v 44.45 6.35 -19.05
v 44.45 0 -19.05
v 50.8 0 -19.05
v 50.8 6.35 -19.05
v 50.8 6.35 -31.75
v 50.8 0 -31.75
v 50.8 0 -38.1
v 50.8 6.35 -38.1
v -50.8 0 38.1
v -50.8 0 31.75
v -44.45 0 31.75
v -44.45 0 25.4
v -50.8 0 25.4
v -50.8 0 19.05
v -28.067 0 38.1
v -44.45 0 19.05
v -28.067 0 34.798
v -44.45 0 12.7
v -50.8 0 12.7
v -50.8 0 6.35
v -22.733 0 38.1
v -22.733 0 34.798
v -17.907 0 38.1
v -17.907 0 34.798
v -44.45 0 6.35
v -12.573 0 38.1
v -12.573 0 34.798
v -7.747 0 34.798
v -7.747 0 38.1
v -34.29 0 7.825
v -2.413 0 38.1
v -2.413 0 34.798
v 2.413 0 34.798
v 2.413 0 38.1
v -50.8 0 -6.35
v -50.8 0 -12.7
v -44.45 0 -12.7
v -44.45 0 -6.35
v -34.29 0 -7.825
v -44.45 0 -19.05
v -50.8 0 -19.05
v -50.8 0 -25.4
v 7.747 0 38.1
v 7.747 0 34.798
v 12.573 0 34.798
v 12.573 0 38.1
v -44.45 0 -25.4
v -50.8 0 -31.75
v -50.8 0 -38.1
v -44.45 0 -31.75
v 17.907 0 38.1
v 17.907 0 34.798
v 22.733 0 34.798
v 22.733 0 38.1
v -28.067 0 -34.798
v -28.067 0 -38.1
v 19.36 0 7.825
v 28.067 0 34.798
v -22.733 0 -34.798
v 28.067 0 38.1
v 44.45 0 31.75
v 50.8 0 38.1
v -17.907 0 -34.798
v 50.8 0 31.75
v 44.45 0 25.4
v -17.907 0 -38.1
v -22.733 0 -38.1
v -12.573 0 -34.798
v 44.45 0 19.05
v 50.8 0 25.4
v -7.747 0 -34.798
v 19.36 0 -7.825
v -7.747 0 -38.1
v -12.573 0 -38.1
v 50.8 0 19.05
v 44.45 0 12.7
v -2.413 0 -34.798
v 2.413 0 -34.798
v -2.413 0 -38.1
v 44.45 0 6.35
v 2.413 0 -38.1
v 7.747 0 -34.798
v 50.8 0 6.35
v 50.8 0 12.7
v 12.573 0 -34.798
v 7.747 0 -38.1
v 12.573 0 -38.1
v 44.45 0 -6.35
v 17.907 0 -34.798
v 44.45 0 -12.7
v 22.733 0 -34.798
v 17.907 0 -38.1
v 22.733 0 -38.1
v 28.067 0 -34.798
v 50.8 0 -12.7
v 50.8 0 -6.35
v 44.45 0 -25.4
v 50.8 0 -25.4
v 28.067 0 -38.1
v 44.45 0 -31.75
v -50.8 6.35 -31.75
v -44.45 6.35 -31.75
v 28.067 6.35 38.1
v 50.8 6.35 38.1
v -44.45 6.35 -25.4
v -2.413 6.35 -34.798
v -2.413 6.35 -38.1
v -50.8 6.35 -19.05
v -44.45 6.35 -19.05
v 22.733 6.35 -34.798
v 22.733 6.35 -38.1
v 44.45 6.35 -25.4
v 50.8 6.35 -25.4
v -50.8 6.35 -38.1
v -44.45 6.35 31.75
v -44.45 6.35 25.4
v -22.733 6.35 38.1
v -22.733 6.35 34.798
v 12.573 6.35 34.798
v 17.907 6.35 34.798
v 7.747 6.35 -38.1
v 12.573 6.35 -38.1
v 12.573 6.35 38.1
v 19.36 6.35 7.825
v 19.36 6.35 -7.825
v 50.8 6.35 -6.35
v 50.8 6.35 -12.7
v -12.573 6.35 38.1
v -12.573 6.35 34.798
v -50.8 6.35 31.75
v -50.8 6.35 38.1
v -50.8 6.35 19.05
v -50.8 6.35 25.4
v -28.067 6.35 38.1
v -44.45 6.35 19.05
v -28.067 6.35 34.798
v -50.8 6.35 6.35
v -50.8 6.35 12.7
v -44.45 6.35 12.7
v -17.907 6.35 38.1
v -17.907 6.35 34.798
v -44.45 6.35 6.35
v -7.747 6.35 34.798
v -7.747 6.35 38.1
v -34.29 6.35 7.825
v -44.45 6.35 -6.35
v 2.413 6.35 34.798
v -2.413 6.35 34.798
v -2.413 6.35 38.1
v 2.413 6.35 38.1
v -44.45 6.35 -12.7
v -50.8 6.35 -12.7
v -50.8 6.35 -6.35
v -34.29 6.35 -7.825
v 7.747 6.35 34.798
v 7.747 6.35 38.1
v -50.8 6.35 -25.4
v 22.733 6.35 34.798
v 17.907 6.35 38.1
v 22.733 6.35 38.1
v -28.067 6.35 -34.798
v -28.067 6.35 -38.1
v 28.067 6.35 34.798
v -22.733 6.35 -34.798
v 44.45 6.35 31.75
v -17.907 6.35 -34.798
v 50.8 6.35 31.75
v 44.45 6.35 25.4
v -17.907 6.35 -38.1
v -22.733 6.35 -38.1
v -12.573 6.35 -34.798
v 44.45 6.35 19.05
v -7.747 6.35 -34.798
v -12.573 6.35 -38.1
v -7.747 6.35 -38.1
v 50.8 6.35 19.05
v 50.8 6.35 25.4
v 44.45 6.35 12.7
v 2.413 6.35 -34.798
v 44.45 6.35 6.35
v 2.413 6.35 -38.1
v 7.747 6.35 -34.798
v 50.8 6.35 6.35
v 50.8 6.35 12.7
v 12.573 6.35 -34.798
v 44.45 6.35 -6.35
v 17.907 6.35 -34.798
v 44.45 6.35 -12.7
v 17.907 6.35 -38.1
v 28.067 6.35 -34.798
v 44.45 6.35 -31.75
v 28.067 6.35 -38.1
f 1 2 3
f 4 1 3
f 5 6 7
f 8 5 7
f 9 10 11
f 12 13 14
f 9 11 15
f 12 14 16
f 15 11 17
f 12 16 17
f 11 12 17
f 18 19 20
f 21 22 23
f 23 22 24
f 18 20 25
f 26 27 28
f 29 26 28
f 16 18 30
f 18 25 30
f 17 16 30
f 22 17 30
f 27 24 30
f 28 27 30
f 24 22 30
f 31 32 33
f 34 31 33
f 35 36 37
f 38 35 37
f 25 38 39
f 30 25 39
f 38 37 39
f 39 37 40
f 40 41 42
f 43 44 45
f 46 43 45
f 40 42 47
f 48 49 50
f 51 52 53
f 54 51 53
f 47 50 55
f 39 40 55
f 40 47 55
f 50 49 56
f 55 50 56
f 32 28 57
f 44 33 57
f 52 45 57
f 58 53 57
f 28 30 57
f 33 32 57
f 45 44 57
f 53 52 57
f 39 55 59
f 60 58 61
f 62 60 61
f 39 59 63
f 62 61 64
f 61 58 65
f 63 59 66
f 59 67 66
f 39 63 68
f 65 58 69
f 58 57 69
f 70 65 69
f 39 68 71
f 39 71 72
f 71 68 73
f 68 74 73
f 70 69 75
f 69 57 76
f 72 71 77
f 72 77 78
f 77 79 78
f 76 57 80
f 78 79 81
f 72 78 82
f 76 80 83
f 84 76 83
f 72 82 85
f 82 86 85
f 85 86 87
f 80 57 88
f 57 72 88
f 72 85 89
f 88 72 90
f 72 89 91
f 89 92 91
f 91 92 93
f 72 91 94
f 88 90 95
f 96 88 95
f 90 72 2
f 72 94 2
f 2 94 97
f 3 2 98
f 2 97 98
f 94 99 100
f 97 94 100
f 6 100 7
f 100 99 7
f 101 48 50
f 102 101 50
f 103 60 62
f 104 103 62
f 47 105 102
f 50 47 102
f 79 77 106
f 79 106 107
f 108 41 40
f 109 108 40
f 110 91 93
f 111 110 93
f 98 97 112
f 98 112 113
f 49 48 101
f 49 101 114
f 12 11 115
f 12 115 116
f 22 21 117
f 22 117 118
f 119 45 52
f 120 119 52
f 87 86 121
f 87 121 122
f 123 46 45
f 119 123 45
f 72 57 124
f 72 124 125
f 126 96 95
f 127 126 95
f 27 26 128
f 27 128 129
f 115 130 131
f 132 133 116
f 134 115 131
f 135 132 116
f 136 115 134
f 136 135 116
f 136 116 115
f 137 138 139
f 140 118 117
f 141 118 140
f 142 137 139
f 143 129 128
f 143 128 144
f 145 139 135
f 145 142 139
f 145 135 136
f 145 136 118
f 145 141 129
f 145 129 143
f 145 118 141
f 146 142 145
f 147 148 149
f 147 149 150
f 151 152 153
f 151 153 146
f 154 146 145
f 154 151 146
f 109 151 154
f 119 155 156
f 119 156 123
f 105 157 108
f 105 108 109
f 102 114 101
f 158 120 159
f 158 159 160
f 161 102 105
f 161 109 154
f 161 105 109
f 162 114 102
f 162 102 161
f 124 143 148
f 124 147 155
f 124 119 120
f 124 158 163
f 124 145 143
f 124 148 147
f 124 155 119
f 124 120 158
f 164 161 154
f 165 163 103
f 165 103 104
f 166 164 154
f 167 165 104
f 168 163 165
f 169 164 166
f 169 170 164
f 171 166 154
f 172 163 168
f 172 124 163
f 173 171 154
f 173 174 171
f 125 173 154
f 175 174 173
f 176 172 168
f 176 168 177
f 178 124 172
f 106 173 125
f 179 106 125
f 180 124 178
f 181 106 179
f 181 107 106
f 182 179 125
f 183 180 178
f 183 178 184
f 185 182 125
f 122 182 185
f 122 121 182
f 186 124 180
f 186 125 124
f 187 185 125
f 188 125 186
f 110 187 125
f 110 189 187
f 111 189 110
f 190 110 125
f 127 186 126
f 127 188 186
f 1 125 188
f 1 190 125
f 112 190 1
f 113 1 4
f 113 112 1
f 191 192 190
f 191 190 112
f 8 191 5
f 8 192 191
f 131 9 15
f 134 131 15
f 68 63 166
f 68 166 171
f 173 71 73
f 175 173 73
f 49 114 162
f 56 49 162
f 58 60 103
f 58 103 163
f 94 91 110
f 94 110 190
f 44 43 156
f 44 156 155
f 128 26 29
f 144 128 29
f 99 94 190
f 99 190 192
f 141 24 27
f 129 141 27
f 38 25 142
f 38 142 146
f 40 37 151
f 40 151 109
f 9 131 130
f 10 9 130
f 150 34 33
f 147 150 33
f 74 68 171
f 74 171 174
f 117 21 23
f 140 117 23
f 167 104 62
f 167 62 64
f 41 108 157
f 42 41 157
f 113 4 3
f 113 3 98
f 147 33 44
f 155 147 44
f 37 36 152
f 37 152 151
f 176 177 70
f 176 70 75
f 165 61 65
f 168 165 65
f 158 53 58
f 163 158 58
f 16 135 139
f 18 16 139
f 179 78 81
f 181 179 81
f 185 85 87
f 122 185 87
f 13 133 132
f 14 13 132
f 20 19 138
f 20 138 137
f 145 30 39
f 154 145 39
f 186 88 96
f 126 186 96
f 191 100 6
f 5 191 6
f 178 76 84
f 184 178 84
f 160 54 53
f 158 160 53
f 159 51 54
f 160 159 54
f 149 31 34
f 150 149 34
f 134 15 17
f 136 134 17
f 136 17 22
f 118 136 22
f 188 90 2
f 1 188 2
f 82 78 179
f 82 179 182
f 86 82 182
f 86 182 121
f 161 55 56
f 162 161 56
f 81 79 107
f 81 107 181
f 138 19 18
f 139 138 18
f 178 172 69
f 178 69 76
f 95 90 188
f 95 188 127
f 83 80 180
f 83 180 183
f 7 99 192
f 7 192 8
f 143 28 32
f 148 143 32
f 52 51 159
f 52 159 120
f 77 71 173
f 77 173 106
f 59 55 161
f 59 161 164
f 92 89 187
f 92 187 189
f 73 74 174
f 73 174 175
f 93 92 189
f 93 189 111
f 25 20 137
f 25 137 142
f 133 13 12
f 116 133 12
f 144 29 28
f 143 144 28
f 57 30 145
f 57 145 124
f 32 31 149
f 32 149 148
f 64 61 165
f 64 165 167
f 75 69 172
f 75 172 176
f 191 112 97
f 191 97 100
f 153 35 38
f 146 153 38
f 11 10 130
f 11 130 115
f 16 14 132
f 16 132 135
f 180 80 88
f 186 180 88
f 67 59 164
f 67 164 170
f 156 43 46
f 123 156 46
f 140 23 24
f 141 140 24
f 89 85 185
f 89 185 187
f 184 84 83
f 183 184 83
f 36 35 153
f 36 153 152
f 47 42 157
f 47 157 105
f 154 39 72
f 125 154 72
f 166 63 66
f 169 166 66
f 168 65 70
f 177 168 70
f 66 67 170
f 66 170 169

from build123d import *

# Parameters (mm, degrees)
SKETCH1_W           = 88.9
SKETCH1_H           = 76.2
SKETCH1_W_2         = 53.65
SKETCH1_H_2         = 15.65
BOSS_EXTRUDE1_DEPTH = 6.35
SKETCH2_W           = 5.334
SKETCH2_H           = 3.302
CUT_EXTRUDE1_DEPTH  = 59.887477446
SKETCH3_W           = 6.35
SKETCH3_H           = 6.35
BOSS_EXTRUDE2_DEPTH = 6.35


with BuildPart() as part:
    # Sketch1 → Boss-Extrude1 (new body)
    with BuildSketch(Plane(origin=(0, 0, 0), x_dir=(1, 0, 0), z_dir=(0, 1, 0))):
        Rectangle(SKETCH1_W, SKETCH1_H)
        with Locations((-7.465, 0)):
            Rectangle(SKETCH1_W_2, SKETCH1_H_2, mode=Mode.SUBTRACT)
    extrude(amount=BOSS_EXTRUDE1_DEPTH)

    # Sketch2 → Cut-Extrude1 (cut, through all)
    with BuildSketch(Plane(origin=(0, 0, 0), x_dir=(1, 0, 0), z_dir=(0, 1, 0))):
        with Locations((-25.4, -36.449)):
            Rectangle(SKETCH2_W, SKETCH2_H)
        with Locations((-15.24, -36.449)):
            Rectangle(SKETCH2_W, SKETCH2_H)
        with Locations((-5.08, -36.449)):
            Rectangle(SKETCH2_W, SKETCH2_H)
        with Locations((5.08, -36.449)):
            Rectangle(SKETCH2_W, SKETCH2_H)
        with Locations((15.24, -36.449)):
            Rectangle(SKETCH2_W, SKETCH2_H)
        with Locations((25.4, -36.449)):
            Rectangle(SKETCH2_W, SKETCH2_H)
        with Locations((25.4, 36.449)):
            Rectangle(SKETCH2_W, SKETCH2_H)
        with Locations((15.24, 36.449)):
            Rectangle(SKETCH2_W, SKETCH2_H)
        with Locations((5.08, 36.449)):
            Rectangle(SKETCH2_W, SKETCH2_H)
        with Locations((-5.08, 36.449)):
            Rectangle(SKETCH2_W, SKETCH2_H)
        with Locations((-15.24, 36.449)):
            Rectangle(SKETCH2_W, SKETCH2_H)
        with Locations((-25.4, 36.449)):
            Rectangle(SKETCH2_W, SKETCH2_H)
    extrude(amount=CUT_EXTRUDE1_DEPTH, mode=Mode.SUBTRACT)

    # Sketch3 → Boss-Extrude2 (add)
    with BuildSketch(Plane(origin=(0, 6.35, 0), x_dir=(1, 0, 0), z_dir=(0, 1, 0))):
        with Locations((-47.625, 34.925)):
            Rectangle(SKETCH3_W, SKETCH3_H)
        with Locations((-47.625, 22.225)):
            Rectangle(SKETCH3_W, SKETCH3_H)
        with Locations((-47.625, 9.525)):
            Rectangle(SKETCH3_W, SKETCH3_H)
        with Locations((-47.625, -9.525)):
            Rectangle(SKETCH3_W, SKETCH3_H)
        with Locations((-47.625, -22.225)):
            Rectangle(SKETCH3_W, SKETCH3_H)
        with Locations((-47.625, -34.925)):
            Rectangle(SKETCH3_W, SKETCH3_H)
        with Locations((47.625, -34.925)):
            Rectangle(SKETCH3_W, SKETCH3_H)
        with Locations((47.625, -22.225)):
            Rectangle(SKETCH3_W, SKETCH3_H)
        with Locations((47.625, -9.525)):
            Rectangle(SKETCH3_W, SKETCH3_H)
        with Locations((47.625, 9.525)):
            Rectangle(SKETCH3_W, SKETCH3_H)
        with Locations((47.625, 22.225)):
            Rectangle(SKETCH3_W, SKETCH3_H)
        with Locations((47.625, 34.925)):
            Rectangle(SKETCH3_W, SKETCH3_H)
    extrude(amount=-BOSS_EXTRUDE2_DEPTH)


solid = part.part
